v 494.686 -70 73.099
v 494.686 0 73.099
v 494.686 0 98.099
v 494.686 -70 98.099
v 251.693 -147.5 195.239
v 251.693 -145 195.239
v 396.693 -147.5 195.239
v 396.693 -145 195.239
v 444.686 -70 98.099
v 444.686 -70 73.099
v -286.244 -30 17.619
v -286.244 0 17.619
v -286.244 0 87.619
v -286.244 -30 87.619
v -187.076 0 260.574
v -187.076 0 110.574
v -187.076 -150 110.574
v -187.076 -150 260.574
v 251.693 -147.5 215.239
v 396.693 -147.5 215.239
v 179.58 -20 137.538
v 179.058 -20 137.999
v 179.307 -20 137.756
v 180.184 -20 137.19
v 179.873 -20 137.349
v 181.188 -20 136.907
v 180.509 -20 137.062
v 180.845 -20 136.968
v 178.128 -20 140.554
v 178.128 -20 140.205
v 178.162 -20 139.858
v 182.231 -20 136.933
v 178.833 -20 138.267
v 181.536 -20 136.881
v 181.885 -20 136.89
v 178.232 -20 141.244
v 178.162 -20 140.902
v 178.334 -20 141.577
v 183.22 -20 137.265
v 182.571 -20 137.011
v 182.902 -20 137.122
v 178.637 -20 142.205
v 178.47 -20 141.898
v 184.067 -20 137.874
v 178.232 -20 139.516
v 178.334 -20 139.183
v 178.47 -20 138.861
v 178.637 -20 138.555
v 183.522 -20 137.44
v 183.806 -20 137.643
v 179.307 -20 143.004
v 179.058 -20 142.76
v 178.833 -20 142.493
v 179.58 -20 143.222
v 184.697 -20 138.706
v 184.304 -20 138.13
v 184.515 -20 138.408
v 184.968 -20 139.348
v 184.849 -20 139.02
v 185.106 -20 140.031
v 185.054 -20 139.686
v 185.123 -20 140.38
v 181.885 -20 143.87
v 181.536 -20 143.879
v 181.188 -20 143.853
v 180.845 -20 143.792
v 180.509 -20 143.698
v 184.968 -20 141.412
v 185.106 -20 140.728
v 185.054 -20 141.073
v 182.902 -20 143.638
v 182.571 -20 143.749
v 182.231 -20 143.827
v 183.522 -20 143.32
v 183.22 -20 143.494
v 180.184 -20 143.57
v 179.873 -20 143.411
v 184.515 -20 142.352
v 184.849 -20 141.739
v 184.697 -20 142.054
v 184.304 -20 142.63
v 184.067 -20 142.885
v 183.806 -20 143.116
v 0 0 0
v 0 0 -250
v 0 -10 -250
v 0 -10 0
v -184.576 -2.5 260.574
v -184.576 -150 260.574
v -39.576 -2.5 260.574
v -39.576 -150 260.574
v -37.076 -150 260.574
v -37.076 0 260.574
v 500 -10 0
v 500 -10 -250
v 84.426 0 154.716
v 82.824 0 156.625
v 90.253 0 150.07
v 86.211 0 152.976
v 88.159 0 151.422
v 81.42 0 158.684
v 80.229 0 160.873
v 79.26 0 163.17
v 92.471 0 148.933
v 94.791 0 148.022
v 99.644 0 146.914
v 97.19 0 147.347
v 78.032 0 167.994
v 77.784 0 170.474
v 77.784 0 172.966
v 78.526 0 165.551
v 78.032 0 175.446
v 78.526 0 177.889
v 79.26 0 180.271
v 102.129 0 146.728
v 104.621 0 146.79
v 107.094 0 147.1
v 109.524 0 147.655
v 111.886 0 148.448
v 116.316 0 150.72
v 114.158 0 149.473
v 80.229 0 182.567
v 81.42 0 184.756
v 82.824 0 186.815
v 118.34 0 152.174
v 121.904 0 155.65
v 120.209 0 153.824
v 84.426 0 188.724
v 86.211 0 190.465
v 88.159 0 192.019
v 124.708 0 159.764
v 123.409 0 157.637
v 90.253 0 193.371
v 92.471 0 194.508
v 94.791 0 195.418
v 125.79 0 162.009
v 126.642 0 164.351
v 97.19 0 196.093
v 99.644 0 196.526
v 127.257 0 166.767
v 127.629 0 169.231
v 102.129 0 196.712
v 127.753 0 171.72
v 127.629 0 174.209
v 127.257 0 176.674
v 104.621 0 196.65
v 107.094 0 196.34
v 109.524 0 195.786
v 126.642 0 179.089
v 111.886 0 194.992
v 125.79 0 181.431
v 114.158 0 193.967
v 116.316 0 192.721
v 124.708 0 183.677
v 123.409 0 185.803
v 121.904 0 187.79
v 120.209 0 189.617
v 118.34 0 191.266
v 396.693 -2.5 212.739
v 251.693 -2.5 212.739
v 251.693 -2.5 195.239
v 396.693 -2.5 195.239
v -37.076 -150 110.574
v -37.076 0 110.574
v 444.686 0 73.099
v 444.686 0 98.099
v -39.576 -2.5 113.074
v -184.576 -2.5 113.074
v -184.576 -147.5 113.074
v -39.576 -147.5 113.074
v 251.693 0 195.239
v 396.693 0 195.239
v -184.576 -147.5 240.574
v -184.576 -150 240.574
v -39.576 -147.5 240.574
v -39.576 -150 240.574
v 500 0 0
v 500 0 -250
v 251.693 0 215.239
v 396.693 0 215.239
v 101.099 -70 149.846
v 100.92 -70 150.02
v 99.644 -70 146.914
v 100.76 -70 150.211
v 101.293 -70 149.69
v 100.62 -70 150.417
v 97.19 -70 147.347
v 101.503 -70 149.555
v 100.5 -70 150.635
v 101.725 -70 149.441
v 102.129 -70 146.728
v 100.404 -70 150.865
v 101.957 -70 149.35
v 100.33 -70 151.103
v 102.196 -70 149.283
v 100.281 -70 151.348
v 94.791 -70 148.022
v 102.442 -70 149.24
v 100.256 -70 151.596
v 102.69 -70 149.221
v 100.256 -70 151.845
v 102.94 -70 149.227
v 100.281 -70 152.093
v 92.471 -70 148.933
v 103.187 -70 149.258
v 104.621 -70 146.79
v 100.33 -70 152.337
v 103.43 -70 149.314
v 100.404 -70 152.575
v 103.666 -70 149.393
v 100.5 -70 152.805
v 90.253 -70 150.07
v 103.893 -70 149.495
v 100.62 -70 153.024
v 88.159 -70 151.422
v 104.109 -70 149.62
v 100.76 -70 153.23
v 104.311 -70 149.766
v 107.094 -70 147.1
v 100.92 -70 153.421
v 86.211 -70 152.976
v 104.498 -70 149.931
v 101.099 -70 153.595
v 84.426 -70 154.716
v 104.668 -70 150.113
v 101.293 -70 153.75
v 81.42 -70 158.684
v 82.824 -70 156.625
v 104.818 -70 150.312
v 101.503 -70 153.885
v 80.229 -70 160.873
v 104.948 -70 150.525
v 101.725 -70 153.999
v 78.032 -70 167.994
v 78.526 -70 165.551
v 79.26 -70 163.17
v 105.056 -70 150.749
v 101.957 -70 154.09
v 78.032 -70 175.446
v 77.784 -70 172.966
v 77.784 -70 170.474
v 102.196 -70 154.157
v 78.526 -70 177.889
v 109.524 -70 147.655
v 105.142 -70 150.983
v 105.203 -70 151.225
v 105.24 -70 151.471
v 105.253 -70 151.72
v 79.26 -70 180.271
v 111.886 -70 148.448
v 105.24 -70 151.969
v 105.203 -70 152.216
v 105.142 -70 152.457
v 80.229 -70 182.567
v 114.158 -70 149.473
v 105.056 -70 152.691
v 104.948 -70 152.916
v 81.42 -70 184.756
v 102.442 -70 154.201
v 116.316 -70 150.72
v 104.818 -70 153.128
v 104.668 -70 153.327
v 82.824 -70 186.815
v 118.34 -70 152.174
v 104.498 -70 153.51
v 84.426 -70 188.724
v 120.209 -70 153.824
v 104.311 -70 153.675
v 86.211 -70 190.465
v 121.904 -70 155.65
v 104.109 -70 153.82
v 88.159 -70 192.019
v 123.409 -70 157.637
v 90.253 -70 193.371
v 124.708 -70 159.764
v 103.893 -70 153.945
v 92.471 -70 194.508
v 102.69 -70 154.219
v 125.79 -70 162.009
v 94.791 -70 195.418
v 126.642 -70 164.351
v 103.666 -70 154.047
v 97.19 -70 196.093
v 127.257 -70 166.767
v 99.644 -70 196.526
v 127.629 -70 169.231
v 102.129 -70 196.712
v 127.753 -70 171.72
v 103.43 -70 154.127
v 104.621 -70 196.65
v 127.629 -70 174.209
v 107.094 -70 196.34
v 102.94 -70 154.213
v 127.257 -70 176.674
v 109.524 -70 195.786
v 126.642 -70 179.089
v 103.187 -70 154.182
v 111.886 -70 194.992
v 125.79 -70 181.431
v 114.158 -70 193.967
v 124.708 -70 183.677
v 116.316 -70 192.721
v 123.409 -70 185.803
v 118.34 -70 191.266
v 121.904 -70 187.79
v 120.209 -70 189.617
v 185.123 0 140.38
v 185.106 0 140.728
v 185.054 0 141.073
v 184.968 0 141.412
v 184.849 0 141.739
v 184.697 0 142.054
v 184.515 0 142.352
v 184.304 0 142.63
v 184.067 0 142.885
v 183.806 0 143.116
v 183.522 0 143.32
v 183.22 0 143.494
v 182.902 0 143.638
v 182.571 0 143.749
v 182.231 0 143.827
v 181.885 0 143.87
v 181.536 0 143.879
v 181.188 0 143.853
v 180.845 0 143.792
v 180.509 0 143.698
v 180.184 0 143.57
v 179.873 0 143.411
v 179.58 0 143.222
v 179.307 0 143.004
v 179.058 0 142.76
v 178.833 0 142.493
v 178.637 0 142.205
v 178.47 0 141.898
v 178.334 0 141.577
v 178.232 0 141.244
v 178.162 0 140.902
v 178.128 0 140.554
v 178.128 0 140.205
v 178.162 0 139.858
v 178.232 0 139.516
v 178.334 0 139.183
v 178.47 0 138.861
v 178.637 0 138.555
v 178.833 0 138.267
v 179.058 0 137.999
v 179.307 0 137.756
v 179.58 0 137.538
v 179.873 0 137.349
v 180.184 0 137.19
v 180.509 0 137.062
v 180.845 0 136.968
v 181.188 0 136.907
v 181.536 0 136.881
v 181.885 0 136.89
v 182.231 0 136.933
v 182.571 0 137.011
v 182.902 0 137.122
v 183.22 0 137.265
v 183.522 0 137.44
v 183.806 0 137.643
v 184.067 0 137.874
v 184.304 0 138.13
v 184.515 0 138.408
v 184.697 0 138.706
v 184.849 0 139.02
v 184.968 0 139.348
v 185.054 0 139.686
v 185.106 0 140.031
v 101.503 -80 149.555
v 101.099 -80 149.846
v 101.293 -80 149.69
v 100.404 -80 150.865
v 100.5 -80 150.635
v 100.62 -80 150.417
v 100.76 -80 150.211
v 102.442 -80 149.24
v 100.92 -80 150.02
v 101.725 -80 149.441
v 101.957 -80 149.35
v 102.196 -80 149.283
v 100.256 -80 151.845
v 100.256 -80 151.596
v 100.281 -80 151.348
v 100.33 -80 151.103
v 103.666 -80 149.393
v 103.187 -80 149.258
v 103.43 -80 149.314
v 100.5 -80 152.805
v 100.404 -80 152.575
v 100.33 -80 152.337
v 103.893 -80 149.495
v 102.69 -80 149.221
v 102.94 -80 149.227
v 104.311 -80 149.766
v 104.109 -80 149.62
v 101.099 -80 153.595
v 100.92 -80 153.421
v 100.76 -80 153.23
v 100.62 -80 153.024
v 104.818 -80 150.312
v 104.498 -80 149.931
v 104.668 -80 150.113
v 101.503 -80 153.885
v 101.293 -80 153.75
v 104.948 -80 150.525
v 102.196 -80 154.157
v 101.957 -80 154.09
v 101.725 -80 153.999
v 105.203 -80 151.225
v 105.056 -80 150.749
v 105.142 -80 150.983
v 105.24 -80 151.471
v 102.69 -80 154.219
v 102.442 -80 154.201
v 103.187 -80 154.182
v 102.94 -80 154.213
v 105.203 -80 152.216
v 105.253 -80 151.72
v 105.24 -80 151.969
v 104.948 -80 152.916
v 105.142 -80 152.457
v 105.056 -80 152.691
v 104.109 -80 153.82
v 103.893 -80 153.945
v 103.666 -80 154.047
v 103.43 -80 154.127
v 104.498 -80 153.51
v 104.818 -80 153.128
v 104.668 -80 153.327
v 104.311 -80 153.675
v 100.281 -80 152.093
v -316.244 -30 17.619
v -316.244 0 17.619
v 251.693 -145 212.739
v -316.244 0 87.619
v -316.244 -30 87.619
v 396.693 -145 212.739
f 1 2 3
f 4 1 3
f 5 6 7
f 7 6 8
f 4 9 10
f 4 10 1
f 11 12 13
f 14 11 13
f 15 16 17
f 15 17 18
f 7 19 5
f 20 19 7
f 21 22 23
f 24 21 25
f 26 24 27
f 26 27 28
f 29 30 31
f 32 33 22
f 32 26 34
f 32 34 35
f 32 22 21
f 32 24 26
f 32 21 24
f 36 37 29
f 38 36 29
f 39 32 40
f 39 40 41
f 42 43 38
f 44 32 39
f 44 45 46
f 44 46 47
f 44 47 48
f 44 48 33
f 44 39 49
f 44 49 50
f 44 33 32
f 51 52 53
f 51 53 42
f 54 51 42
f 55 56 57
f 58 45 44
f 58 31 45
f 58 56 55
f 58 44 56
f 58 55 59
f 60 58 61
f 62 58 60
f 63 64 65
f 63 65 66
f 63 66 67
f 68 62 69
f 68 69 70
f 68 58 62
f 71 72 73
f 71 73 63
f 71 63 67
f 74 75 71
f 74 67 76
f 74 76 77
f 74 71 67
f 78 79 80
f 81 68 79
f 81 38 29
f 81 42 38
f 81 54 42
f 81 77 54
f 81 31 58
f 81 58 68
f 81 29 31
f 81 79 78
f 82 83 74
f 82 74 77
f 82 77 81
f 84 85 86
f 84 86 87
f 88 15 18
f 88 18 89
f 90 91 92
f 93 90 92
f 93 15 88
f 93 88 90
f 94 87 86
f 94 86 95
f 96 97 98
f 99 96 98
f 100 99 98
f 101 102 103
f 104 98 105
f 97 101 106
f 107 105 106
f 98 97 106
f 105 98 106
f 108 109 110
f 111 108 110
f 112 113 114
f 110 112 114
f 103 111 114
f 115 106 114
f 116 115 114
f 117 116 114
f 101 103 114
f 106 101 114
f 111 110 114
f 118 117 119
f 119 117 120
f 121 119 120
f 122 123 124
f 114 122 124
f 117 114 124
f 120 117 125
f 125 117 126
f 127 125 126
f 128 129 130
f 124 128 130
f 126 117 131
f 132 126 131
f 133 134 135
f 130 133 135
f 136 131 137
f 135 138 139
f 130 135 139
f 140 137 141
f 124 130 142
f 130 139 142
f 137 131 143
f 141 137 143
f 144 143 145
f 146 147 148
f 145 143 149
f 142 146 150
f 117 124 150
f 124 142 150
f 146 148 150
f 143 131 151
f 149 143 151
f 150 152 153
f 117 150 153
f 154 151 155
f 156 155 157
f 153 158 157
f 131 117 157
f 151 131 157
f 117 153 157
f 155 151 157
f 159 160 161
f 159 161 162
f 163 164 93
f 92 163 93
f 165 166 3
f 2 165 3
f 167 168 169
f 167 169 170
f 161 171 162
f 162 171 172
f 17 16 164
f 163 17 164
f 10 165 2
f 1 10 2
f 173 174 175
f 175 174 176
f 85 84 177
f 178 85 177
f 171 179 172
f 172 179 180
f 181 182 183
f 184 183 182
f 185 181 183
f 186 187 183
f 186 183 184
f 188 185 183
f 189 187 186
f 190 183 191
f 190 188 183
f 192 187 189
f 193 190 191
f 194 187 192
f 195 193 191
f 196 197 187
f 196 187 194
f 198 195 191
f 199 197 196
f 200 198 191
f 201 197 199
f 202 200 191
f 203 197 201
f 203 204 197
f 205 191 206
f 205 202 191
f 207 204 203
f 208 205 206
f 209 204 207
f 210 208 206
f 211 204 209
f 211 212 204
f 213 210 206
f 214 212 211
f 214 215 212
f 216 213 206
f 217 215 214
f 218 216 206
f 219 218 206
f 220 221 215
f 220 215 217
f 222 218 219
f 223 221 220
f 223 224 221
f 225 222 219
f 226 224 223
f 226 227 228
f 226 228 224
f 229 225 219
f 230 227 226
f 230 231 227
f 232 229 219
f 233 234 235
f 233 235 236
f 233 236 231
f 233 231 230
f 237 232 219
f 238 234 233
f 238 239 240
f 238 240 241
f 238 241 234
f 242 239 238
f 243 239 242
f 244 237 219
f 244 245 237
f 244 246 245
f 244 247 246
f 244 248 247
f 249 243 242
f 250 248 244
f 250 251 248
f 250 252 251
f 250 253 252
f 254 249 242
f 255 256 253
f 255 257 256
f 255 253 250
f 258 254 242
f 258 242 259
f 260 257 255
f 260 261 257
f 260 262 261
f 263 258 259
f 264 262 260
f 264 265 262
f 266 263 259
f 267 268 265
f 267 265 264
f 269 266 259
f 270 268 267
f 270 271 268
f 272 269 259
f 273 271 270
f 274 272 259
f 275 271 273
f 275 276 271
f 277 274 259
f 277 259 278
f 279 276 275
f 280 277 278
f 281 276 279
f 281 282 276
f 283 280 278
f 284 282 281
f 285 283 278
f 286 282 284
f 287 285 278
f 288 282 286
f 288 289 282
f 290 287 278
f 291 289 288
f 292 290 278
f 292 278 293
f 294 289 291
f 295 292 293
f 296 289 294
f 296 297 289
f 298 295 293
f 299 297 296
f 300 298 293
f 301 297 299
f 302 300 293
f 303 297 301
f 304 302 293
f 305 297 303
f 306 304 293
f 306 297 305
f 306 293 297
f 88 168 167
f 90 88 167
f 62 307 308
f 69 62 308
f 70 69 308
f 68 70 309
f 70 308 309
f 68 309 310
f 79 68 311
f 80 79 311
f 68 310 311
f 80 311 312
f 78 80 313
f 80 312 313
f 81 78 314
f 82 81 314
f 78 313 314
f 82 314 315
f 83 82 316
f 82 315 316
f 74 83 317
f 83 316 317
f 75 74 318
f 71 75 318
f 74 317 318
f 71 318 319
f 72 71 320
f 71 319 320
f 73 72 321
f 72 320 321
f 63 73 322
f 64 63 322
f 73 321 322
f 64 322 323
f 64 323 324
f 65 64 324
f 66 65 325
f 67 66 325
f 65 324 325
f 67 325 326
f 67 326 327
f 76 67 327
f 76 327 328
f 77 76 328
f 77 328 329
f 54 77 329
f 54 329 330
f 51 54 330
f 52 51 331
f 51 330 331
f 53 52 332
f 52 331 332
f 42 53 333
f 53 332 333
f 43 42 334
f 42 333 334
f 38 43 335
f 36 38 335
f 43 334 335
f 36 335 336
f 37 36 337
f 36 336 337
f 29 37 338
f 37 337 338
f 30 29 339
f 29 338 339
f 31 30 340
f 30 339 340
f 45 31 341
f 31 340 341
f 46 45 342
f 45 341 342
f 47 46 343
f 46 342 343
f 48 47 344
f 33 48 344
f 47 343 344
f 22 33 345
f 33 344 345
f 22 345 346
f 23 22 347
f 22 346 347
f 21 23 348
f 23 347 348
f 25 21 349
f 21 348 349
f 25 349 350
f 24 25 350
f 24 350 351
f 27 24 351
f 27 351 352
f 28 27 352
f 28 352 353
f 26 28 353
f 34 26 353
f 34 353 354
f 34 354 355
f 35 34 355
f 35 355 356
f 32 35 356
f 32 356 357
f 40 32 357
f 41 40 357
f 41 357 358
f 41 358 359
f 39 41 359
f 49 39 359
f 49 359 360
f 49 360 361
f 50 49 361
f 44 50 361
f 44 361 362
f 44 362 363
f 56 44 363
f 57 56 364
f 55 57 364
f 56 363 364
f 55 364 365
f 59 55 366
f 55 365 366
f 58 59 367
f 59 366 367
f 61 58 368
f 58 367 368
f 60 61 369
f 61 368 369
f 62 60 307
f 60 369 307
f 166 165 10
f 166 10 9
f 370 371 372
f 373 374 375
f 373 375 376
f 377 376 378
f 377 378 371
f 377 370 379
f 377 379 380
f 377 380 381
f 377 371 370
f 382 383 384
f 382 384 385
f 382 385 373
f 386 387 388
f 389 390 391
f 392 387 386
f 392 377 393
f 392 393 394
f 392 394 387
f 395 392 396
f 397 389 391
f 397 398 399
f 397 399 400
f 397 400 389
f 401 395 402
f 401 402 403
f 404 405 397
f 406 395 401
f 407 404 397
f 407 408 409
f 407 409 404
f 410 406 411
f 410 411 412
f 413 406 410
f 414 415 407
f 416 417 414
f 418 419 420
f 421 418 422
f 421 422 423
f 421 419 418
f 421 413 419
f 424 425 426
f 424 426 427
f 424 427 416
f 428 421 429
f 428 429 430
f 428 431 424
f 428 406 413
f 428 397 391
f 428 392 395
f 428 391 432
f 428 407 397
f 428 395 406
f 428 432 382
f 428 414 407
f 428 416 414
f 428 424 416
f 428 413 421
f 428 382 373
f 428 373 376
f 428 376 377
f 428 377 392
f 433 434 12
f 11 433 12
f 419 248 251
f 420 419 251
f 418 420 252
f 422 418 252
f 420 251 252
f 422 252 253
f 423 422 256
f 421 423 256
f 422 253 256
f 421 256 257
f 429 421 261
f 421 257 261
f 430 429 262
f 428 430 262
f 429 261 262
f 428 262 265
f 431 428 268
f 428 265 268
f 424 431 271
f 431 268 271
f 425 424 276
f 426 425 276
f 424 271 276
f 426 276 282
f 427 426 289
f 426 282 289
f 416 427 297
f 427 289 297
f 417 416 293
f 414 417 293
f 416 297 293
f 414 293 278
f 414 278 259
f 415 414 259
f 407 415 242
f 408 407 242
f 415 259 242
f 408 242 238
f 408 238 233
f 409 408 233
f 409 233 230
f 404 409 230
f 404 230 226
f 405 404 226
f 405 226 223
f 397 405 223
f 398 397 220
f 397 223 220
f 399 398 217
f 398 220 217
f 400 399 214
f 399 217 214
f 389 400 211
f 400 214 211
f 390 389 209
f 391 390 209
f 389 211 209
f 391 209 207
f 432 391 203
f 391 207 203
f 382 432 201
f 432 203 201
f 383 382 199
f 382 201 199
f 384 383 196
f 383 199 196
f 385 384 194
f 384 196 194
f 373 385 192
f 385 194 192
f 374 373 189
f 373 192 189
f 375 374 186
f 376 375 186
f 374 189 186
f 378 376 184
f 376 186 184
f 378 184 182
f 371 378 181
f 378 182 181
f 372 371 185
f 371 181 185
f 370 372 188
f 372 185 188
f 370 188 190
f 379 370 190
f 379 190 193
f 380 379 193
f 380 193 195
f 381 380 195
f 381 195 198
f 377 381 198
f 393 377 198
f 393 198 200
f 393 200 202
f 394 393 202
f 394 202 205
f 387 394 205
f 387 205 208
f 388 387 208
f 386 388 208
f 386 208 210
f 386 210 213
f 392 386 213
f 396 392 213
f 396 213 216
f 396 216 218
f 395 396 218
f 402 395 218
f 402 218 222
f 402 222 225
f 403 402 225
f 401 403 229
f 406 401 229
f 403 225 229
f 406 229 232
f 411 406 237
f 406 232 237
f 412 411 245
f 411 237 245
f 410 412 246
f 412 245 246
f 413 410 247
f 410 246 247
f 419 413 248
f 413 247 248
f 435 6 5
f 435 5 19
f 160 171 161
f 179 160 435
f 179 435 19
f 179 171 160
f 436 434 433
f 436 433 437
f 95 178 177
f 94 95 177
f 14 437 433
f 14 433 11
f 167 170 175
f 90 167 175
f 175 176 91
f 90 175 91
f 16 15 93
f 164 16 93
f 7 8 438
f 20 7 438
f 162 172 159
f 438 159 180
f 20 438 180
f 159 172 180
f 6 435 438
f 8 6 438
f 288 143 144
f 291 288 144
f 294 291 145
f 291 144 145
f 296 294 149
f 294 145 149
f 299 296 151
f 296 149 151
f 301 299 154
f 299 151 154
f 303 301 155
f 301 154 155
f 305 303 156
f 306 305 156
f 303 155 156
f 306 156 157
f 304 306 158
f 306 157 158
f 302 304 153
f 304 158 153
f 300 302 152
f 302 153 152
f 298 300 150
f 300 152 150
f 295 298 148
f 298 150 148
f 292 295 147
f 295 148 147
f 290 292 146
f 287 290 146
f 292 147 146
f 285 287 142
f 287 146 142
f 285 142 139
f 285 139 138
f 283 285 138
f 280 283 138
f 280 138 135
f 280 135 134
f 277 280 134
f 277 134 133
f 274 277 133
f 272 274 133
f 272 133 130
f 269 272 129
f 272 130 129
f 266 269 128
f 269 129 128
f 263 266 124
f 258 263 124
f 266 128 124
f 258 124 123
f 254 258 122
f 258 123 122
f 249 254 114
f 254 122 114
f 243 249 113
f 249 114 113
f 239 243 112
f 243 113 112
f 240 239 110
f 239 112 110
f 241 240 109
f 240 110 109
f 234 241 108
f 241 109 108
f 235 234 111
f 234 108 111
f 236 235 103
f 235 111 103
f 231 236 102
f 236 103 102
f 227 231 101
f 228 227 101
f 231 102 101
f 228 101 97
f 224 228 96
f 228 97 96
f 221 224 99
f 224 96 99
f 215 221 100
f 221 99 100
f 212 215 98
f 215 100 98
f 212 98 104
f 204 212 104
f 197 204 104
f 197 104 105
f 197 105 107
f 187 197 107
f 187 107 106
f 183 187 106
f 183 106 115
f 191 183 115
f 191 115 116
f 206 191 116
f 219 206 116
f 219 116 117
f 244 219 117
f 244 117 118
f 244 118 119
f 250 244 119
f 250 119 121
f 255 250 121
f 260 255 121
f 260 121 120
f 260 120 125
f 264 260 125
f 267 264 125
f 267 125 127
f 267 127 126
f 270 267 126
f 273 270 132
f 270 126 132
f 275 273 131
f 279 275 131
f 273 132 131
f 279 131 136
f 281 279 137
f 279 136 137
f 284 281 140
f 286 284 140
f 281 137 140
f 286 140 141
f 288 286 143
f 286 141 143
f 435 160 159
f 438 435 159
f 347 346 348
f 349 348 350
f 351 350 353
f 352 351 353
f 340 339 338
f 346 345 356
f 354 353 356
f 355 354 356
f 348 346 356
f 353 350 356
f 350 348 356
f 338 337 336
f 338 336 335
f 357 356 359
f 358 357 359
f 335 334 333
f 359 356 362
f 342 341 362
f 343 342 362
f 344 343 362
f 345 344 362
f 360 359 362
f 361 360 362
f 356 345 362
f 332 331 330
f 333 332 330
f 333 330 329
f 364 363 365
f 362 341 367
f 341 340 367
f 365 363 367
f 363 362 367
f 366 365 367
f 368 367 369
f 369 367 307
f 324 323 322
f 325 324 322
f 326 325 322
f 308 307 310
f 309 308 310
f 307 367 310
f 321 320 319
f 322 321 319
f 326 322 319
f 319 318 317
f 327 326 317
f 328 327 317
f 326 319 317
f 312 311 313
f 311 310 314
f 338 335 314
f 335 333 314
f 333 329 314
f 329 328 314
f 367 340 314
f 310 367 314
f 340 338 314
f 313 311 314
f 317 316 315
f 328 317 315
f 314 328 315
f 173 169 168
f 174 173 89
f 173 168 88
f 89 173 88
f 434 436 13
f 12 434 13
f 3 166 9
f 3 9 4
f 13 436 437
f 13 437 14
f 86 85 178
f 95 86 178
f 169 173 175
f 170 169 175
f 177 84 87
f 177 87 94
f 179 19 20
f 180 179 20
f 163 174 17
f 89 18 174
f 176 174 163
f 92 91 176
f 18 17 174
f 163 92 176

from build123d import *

# Parameters (mm, degrees)
F0_W      = 500
F0_H      = 250
F2_DEPTH  = 10
F1_W      = 30
F1_H      = 70
F3_DEPTH  = 30
F4_W      = 150
F4_H      = 150
F5_DEPTH  = 150
F6_T      = -2.5
F8_DEPTH  = 100
F9_R      = 25
F10_DEPTH = 70
F11_R     = 2.5
F12_DEPTH = 10
F13_W     = 145
F13_H     = 20
F14_DEPTH = 147.5
F15_T     = -2.5
F16_R     = 3.5
F17_DEPTH = 20
F18_W     = 50
F18_H     = 25
F19_DEPTH = 70


with BuildPart() as f2:
    # F0 (on Front) → F2 (new body)
    with BuildSketch(Plane.XZ):
        with Locations((250, -125)):
            Rectangle(F0_W, F0_H)
    extrude(amount=F2_DEPTH)


with BuildPart() as f3:
    # F1 (on Front) → F3 (new body)
    with BuildSketch(Plane.XZ):
        with Locations((-301.243767, 52.618936)):
            Rectangle(F1_W, F1_H)
    extrude(amount=F3_DEPTH)


with BuildPart() as f5:
    # F4 (on Front) → F5 (new body)
    with BuildSketch(Plane.XZ):
        with Locations((-112.076306, 185.574)):
            Rectangle(F4_W, F4_H)
    extrude(amount=F5_DEPTH)

    # F6
    f6_openings = [f5.faces().sort_by_distance(p)[0] for p in [
        (-112.076306, -75, 260.574),
    ]]
    offset(amount=F6_T, openings=f6_openings)

    # F7 (on face) → F8 (cut)
    with BuildSketch(Plane.XZ.offset(150)):
        Polygon((-39.576306, 260.574), (-112.076306, 260.574), (-184.576306, 260.574), (-184.576306, 240.574), (-39.576306, 240.574), align=None)
    extrude(amount=-F8_DEPTH, mode=Mode.SUBTRACT)


with BuildPart() as f10:
    # F9 (on Front) → F10 (new body)
    with BuildSketch(Plane.XZ):
        with Locations((102.752738, 171.720177)):
            Circle(F9_R)
    extrude(amount=F10_DEPTH)

    # F11 (on face) → F12 (join)
    with BuildSketch(Plane.XZ.offset(70)):
        with Locations((102.752738, 151.720177)):
            Circle(F11_R)
    extrude(amount=F12_DEPTH)


with BuildPart() as f14:
    # F13 (on Front) → F14 (new body)
    with BuildSketch(Plane.XZ):
        with Locations((324.193468, 205.238978)):
            Rectangle(F13_W, F13_H)
    extrude(amount=F14_DEPTH)

    # F15
    f15_openings = [f14.faces().sort_by_distance(p)[0] for p in [
        (396.693468, -73.75, 205.238978),
        (251.693468, -73.75, 205.238978),
        (324.193468, -73.75, 195.238978),
    ]]
    offset(amount=F15_T, openings=f15_openings)


with BuildPart() as f17:
    # F16 (on Front) → F17 (new body)
    with BuildSketch(Plane.XZ):
        with Locations((181.62334, 140.379891)):
            Circle(F16_R)
    extrude(amount=F17_DEPTH)


with BuildPart() as f19:
    # F18 (on Front) → F19 (new body)
    with BuildSketch(Plane.XZ):
        with Locations((469.686425, 85.599427)):
            Rectangle(F18_W, F18_H)
    extrude(amount=F19_DEPTH)


solid = Compound([f2.part, f3.part, f5.part, f10.part, f14.part, f17.part, f19.part])
